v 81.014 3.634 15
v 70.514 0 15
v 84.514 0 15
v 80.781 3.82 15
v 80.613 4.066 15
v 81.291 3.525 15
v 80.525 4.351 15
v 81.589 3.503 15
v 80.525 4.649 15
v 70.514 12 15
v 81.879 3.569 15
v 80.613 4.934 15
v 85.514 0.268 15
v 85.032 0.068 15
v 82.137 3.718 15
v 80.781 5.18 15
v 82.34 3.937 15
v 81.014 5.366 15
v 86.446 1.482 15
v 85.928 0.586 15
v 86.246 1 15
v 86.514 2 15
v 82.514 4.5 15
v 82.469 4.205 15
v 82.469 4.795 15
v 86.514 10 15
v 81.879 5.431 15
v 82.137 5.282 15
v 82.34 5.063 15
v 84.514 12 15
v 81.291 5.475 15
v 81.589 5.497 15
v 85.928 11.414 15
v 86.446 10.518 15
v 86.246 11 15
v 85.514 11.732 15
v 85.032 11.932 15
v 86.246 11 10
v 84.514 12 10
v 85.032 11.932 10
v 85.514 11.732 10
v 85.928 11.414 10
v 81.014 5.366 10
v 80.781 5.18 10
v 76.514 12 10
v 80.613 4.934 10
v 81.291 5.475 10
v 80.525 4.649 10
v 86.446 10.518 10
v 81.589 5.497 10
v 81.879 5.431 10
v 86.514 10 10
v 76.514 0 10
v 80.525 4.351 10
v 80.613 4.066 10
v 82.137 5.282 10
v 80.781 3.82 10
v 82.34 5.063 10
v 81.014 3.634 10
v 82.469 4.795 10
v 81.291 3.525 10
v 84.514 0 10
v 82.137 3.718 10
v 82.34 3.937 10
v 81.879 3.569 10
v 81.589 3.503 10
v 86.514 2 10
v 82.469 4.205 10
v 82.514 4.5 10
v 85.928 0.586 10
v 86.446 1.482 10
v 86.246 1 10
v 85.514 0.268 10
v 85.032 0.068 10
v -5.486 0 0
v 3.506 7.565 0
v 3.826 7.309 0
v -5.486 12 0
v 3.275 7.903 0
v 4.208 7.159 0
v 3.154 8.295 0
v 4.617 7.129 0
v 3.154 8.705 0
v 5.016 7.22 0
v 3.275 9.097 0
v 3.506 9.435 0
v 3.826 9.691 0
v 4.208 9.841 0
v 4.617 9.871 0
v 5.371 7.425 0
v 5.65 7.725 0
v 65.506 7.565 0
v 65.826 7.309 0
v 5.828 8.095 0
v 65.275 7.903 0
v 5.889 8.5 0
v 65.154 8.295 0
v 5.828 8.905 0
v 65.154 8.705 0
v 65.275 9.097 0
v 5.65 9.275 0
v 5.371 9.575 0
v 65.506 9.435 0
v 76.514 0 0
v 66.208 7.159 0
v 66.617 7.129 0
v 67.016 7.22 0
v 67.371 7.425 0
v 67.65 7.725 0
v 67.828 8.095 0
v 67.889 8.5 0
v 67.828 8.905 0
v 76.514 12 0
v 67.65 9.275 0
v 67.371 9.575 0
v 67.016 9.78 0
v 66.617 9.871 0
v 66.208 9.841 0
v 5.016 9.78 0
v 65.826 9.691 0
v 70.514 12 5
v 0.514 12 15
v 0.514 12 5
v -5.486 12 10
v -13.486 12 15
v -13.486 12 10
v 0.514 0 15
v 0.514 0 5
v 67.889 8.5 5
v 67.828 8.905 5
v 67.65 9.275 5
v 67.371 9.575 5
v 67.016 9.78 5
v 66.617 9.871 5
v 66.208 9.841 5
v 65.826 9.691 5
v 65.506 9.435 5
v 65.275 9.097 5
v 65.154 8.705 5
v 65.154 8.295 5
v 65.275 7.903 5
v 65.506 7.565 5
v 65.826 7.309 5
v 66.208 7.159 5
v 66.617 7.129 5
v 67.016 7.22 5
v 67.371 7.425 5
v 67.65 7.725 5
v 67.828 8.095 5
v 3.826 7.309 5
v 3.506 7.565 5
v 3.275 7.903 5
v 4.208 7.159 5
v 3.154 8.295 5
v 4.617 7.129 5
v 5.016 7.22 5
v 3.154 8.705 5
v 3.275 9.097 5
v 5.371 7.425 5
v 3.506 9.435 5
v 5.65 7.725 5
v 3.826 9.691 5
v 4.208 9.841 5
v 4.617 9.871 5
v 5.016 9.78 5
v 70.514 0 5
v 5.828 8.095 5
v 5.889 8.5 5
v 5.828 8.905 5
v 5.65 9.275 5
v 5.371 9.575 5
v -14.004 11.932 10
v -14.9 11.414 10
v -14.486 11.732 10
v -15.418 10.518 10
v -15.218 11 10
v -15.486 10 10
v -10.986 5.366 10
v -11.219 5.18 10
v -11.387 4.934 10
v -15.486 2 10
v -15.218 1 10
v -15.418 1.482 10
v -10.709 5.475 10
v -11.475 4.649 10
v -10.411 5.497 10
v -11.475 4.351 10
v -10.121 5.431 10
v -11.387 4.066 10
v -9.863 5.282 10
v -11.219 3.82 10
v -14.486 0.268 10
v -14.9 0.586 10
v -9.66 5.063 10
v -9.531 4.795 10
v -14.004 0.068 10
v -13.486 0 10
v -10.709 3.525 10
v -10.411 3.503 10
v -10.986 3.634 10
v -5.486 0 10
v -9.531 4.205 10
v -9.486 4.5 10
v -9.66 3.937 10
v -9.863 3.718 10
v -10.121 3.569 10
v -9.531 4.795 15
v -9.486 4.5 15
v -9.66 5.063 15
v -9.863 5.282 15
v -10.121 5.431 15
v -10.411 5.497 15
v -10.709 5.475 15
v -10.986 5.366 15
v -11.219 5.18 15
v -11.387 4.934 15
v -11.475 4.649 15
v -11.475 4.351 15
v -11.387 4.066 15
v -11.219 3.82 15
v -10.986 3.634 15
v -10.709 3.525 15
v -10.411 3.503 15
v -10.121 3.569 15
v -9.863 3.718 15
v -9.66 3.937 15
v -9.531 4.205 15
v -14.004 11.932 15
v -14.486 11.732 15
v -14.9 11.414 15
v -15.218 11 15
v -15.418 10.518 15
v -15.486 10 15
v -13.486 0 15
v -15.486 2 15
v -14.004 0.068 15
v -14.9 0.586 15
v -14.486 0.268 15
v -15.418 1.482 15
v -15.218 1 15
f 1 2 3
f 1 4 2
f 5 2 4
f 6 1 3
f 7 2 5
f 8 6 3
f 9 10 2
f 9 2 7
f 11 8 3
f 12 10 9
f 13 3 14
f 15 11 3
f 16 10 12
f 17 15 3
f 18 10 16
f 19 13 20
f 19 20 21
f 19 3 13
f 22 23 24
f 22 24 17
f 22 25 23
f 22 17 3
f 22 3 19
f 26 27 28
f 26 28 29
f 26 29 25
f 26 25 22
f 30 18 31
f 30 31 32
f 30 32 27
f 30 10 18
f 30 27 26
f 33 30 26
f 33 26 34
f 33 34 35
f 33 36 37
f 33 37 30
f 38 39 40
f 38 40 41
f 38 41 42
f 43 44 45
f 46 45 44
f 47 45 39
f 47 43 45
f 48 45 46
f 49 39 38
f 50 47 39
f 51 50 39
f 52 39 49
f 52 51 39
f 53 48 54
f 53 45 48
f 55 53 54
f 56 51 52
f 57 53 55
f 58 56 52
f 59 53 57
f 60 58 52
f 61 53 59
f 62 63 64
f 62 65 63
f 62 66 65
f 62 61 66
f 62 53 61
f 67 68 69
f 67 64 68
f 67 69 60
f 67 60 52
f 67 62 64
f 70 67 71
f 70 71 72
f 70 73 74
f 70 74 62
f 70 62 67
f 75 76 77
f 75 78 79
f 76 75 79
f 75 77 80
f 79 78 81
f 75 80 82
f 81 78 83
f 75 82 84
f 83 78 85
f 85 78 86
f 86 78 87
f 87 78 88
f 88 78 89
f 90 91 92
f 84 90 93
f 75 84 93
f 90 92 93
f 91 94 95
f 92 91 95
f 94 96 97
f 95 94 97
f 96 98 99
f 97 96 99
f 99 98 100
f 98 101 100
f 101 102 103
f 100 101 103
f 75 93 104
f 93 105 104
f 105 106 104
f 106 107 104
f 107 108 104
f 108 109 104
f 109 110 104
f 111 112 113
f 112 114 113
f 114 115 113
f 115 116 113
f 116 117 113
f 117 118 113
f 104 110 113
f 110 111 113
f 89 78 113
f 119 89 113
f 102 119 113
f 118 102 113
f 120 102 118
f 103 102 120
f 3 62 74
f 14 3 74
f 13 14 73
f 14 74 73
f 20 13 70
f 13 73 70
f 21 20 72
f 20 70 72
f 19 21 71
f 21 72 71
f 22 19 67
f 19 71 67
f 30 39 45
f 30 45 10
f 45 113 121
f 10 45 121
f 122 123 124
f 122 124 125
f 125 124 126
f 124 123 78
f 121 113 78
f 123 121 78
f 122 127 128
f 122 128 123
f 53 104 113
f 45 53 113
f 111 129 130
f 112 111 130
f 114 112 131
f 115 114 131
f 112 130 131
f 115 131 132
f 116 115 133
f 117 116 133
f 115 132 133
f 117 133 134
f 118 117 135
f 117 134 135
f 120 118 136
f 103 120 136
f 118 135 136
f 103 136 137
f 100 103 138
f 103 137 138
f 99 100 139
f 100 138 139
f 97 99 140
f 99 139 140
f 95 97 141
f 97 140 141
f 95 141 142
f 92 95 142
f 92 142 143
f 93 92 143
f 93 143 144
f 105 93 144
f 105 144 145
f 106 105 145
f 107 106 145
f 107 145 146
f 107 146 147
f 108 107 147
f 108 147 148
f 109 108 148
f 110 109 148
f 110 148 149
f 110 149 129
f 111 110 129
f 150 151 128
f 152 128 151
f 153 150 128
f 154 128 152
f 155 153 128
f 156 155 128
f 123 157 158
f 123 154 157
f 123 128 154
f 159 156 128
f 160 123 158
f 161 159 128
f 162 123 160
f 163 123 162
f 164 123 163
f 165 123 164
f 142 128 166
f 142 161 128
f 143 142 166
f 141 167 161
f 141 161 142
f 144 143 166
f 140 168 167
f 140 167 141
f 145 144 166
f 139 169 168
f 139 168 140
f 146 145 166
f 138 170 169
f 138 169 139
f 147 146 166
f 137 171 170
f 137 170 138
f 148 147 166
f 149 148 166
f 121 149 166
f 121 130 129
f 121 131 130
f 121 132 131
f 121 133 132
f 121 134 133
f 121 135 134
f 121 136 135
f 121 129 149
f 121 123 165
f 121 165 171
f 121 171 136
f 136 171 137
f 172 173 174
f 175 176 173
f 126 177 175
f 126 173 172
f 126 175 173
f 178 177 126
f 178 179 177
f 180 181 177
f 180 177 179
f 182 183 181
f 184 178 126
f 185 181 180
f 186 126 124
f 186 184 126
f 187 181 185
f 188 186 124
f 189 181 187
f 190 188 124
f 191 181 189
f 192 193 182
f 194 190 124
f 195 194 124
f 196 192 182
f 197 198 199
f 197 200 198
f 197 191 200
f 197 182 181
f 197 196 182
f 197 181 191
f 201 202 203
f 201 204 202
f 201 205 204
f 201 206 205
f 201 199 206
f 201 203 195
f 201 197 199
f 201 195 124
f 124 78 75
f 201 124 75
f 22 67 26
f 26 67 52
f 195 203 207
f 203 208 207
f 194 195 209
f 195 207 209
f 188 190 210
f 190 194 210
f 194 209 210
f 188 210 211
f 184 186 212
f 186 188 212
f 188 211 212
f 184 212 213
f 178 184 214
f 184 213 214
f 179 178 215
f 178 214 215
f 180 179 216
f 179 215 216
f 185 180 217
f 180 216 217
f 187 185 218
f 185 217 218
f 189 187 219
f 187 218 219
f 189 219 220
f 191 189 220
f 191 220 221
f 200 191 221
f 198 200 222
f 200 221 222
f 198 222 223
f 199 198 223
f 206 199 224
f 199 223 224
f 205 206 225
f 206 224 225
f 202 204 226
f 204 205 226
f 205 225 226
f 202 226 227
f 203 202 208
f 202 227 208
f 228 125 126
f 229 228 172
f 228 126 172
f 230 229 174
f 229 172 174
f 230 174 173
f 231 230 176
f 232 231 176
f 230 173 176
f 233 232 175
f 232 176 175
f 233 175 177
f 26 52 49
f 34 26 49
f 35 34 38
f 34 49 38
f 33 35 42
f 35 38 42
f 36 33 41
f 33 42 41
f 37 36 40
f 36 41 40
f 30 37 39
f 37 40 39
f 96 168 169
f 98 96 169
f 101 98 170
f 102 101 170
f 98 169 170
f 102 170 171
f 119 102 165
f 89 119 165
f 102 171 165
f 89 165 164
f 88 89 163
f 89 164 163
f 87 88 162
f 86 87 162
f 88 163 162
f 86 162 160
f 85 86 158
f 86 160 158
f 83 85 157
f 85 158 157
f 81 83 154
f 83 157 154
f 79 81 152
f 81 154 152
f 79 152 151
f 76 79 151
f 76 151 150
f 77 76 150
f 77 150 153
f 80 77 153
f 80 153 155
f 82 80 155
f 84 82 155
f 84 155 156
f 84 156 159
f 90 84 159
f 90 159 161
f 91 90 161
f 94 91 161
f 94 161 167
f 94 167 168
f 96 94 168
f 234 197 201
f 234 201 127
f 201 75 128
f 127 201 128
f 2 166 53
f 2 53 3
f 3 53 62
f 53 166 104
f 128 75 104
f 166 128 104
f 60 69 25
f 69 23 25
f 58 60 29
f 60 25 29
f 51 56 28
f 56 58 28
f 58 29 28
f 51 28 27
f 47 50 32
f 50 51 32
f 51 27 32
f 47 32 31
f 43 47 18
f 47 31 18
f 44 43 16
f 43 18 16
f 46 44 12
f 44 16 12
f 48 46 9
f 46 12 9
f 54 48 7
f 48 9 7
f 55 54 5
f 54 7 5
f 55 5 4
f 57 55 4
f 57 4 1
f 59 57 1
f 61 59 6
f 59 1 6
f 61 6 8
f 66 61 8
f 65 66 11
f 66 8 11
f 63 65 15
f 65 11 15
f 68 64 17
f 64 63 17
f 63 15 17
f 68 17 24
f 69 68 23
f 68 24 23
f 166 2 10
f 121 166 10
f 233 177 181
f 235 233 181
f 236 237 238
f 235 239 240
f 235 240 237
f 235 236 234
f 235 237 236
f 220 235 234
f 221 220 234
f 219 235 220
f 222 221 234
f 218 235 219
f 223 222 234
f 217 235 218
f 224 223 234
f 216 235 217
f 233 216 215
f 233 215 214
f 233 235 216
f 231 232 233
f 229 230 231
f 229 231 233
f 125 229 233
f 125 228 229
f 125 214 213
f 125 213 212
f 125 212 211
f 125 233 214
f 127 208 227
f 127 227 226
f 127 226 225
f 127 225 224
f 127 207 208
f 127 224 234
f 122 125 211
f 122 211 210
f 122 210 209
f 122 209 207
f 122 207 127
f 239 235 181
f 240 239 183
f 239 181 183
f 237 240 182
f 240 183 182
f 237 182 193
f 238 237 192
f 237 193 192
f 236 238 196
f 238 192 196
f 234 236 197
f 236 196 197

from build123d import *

# Parameters (mm, degrees)
F1_DEPTH      = 15
F2_W          = 70
F2_H          = 12
F3_DEPTH      = 10
F4_R          = 1.375
F4_R_2        = 1
F5_DEPTH      = 25
F5_DEPTH_BACK = 25
F6_R          = 1
F7_DEPTH      = 10


with BuildPart() as f1:
    # F0 (on Top) → F1 (new body)
    with BuildSketch(Plane.XY):
        with BuildLine():
            ThreePointArc((-15.4861029406, 2), (-14.9003165029, 0.5857864376), (-13.4861029406, 0))
            Line((-13.4861029406, 0), (84.5138970594, 0))
            ThreePointArc((84.5138970594, 0), (85.9281106218, 0.5857864376), (86.5138970594, 2))
            Line((86.5138970594, 2), (86.5138970594, 10))
            ThreePointArc((86.5138970594, 10), (85.9281106218, 11.4142135624), (84.5138970594, 12))
            Line((84.5138970594, 12), (-13.4861029406, 12))
            ThreePointArc((-13.4861029406, 12), (-14.9003165029, 11.4142135624), (-15.4861029406, 10))
            Line((-15.4861029406, 10), (-15.4861029406, 2))
        make_face()
    extrude(amount=F1_DEPTH)

    # F2 (on face) → F3 (cut)
    with BuildSketch(Plane.XY.offset(15)):
        with Locations((35.5138970594, 6)):
            Rectangle(F2_W, F2_H)
    extrude(amount=-F3_DEPTH, mode=Mode.SUBTRACT)

    # F4 (on face) → F5 (cut, two sides)
    with BuildSketch(Plane.XY.offset(5)) as f5_sk:
        with Locations((4.5138970594, 8.5)):
            Circle(F4_R)
        with Locations((66.5138970594, 8.5)):
            Circle(F4_R)
        with Locations((-10.4861029406, 4.5)):
            Circle(F4_R_2)
        with Locations((81.5138970594, 4.5)):
            Circle(F4_R_2)
    extrude(amount=-F5_DEPTH, mode=Mode.SUBTRACT)
    extrude(f5_sk.sketch, amount=F5_DEPTH_BACK, mode=Mode.SUBTRACT)

    # F6 (on face) → F7 (cut)
    with BuildSketch(Plane(origin=(0, 0, 0), x_dir=(1, 0, 0), z_dir=(0, 0, -1))):
        with BuildLine():
            Line((76.5138970594, 0), (76.5138970594, -12))
            Line((76.5138970594, -12), (84.5138970594, -12))
            ThreePointArc((84.5138970594, -12), (85.9281106218, -11.4142135624), (86.5138970594, -10))
            Line((86.5138970594, -10), (86.5138970594, -2))
            ThreePointArc((86.5138970594, -2), (85.9281106218, -0.5857864376), (84.5138970594, 0))
            Line((84.5138970594, 0), (76.5138970594, 0))
        make_face()
        with Locations((81.5138970594, -4.5)):
            Circle(F6_R, mode=Mode.SUBTRACT)
        with BuildLine():
            Line((-13.4861029406, -12), (-5.4861029406, -12))
            Line((-5.4861029406, -12), (-5.4861029406, 0))
            Line((-5.4861029406, 0), (-13.4861029406, 0))
            ThreePointArc((-13.4861029406, 0), (-14.9003165029, -0.5857864376), (-15.4861029406, -2))
            Line((-15.4861029406, -2), (-15.4861029406, -10))
            ThreePointArc((-15.4861029406, -10), (-14.9003165029, -11.4142135624), (-13.4861029406, -12))
        make_face()
        with Locations((-10.4861029406, -4.5)):
            Circle(F6_R, mode=Mode.SUBTRACT)
    extrude(amount=-F7_DEPTH, mode=Mode.SUBTRACT)


solid = f1.part
